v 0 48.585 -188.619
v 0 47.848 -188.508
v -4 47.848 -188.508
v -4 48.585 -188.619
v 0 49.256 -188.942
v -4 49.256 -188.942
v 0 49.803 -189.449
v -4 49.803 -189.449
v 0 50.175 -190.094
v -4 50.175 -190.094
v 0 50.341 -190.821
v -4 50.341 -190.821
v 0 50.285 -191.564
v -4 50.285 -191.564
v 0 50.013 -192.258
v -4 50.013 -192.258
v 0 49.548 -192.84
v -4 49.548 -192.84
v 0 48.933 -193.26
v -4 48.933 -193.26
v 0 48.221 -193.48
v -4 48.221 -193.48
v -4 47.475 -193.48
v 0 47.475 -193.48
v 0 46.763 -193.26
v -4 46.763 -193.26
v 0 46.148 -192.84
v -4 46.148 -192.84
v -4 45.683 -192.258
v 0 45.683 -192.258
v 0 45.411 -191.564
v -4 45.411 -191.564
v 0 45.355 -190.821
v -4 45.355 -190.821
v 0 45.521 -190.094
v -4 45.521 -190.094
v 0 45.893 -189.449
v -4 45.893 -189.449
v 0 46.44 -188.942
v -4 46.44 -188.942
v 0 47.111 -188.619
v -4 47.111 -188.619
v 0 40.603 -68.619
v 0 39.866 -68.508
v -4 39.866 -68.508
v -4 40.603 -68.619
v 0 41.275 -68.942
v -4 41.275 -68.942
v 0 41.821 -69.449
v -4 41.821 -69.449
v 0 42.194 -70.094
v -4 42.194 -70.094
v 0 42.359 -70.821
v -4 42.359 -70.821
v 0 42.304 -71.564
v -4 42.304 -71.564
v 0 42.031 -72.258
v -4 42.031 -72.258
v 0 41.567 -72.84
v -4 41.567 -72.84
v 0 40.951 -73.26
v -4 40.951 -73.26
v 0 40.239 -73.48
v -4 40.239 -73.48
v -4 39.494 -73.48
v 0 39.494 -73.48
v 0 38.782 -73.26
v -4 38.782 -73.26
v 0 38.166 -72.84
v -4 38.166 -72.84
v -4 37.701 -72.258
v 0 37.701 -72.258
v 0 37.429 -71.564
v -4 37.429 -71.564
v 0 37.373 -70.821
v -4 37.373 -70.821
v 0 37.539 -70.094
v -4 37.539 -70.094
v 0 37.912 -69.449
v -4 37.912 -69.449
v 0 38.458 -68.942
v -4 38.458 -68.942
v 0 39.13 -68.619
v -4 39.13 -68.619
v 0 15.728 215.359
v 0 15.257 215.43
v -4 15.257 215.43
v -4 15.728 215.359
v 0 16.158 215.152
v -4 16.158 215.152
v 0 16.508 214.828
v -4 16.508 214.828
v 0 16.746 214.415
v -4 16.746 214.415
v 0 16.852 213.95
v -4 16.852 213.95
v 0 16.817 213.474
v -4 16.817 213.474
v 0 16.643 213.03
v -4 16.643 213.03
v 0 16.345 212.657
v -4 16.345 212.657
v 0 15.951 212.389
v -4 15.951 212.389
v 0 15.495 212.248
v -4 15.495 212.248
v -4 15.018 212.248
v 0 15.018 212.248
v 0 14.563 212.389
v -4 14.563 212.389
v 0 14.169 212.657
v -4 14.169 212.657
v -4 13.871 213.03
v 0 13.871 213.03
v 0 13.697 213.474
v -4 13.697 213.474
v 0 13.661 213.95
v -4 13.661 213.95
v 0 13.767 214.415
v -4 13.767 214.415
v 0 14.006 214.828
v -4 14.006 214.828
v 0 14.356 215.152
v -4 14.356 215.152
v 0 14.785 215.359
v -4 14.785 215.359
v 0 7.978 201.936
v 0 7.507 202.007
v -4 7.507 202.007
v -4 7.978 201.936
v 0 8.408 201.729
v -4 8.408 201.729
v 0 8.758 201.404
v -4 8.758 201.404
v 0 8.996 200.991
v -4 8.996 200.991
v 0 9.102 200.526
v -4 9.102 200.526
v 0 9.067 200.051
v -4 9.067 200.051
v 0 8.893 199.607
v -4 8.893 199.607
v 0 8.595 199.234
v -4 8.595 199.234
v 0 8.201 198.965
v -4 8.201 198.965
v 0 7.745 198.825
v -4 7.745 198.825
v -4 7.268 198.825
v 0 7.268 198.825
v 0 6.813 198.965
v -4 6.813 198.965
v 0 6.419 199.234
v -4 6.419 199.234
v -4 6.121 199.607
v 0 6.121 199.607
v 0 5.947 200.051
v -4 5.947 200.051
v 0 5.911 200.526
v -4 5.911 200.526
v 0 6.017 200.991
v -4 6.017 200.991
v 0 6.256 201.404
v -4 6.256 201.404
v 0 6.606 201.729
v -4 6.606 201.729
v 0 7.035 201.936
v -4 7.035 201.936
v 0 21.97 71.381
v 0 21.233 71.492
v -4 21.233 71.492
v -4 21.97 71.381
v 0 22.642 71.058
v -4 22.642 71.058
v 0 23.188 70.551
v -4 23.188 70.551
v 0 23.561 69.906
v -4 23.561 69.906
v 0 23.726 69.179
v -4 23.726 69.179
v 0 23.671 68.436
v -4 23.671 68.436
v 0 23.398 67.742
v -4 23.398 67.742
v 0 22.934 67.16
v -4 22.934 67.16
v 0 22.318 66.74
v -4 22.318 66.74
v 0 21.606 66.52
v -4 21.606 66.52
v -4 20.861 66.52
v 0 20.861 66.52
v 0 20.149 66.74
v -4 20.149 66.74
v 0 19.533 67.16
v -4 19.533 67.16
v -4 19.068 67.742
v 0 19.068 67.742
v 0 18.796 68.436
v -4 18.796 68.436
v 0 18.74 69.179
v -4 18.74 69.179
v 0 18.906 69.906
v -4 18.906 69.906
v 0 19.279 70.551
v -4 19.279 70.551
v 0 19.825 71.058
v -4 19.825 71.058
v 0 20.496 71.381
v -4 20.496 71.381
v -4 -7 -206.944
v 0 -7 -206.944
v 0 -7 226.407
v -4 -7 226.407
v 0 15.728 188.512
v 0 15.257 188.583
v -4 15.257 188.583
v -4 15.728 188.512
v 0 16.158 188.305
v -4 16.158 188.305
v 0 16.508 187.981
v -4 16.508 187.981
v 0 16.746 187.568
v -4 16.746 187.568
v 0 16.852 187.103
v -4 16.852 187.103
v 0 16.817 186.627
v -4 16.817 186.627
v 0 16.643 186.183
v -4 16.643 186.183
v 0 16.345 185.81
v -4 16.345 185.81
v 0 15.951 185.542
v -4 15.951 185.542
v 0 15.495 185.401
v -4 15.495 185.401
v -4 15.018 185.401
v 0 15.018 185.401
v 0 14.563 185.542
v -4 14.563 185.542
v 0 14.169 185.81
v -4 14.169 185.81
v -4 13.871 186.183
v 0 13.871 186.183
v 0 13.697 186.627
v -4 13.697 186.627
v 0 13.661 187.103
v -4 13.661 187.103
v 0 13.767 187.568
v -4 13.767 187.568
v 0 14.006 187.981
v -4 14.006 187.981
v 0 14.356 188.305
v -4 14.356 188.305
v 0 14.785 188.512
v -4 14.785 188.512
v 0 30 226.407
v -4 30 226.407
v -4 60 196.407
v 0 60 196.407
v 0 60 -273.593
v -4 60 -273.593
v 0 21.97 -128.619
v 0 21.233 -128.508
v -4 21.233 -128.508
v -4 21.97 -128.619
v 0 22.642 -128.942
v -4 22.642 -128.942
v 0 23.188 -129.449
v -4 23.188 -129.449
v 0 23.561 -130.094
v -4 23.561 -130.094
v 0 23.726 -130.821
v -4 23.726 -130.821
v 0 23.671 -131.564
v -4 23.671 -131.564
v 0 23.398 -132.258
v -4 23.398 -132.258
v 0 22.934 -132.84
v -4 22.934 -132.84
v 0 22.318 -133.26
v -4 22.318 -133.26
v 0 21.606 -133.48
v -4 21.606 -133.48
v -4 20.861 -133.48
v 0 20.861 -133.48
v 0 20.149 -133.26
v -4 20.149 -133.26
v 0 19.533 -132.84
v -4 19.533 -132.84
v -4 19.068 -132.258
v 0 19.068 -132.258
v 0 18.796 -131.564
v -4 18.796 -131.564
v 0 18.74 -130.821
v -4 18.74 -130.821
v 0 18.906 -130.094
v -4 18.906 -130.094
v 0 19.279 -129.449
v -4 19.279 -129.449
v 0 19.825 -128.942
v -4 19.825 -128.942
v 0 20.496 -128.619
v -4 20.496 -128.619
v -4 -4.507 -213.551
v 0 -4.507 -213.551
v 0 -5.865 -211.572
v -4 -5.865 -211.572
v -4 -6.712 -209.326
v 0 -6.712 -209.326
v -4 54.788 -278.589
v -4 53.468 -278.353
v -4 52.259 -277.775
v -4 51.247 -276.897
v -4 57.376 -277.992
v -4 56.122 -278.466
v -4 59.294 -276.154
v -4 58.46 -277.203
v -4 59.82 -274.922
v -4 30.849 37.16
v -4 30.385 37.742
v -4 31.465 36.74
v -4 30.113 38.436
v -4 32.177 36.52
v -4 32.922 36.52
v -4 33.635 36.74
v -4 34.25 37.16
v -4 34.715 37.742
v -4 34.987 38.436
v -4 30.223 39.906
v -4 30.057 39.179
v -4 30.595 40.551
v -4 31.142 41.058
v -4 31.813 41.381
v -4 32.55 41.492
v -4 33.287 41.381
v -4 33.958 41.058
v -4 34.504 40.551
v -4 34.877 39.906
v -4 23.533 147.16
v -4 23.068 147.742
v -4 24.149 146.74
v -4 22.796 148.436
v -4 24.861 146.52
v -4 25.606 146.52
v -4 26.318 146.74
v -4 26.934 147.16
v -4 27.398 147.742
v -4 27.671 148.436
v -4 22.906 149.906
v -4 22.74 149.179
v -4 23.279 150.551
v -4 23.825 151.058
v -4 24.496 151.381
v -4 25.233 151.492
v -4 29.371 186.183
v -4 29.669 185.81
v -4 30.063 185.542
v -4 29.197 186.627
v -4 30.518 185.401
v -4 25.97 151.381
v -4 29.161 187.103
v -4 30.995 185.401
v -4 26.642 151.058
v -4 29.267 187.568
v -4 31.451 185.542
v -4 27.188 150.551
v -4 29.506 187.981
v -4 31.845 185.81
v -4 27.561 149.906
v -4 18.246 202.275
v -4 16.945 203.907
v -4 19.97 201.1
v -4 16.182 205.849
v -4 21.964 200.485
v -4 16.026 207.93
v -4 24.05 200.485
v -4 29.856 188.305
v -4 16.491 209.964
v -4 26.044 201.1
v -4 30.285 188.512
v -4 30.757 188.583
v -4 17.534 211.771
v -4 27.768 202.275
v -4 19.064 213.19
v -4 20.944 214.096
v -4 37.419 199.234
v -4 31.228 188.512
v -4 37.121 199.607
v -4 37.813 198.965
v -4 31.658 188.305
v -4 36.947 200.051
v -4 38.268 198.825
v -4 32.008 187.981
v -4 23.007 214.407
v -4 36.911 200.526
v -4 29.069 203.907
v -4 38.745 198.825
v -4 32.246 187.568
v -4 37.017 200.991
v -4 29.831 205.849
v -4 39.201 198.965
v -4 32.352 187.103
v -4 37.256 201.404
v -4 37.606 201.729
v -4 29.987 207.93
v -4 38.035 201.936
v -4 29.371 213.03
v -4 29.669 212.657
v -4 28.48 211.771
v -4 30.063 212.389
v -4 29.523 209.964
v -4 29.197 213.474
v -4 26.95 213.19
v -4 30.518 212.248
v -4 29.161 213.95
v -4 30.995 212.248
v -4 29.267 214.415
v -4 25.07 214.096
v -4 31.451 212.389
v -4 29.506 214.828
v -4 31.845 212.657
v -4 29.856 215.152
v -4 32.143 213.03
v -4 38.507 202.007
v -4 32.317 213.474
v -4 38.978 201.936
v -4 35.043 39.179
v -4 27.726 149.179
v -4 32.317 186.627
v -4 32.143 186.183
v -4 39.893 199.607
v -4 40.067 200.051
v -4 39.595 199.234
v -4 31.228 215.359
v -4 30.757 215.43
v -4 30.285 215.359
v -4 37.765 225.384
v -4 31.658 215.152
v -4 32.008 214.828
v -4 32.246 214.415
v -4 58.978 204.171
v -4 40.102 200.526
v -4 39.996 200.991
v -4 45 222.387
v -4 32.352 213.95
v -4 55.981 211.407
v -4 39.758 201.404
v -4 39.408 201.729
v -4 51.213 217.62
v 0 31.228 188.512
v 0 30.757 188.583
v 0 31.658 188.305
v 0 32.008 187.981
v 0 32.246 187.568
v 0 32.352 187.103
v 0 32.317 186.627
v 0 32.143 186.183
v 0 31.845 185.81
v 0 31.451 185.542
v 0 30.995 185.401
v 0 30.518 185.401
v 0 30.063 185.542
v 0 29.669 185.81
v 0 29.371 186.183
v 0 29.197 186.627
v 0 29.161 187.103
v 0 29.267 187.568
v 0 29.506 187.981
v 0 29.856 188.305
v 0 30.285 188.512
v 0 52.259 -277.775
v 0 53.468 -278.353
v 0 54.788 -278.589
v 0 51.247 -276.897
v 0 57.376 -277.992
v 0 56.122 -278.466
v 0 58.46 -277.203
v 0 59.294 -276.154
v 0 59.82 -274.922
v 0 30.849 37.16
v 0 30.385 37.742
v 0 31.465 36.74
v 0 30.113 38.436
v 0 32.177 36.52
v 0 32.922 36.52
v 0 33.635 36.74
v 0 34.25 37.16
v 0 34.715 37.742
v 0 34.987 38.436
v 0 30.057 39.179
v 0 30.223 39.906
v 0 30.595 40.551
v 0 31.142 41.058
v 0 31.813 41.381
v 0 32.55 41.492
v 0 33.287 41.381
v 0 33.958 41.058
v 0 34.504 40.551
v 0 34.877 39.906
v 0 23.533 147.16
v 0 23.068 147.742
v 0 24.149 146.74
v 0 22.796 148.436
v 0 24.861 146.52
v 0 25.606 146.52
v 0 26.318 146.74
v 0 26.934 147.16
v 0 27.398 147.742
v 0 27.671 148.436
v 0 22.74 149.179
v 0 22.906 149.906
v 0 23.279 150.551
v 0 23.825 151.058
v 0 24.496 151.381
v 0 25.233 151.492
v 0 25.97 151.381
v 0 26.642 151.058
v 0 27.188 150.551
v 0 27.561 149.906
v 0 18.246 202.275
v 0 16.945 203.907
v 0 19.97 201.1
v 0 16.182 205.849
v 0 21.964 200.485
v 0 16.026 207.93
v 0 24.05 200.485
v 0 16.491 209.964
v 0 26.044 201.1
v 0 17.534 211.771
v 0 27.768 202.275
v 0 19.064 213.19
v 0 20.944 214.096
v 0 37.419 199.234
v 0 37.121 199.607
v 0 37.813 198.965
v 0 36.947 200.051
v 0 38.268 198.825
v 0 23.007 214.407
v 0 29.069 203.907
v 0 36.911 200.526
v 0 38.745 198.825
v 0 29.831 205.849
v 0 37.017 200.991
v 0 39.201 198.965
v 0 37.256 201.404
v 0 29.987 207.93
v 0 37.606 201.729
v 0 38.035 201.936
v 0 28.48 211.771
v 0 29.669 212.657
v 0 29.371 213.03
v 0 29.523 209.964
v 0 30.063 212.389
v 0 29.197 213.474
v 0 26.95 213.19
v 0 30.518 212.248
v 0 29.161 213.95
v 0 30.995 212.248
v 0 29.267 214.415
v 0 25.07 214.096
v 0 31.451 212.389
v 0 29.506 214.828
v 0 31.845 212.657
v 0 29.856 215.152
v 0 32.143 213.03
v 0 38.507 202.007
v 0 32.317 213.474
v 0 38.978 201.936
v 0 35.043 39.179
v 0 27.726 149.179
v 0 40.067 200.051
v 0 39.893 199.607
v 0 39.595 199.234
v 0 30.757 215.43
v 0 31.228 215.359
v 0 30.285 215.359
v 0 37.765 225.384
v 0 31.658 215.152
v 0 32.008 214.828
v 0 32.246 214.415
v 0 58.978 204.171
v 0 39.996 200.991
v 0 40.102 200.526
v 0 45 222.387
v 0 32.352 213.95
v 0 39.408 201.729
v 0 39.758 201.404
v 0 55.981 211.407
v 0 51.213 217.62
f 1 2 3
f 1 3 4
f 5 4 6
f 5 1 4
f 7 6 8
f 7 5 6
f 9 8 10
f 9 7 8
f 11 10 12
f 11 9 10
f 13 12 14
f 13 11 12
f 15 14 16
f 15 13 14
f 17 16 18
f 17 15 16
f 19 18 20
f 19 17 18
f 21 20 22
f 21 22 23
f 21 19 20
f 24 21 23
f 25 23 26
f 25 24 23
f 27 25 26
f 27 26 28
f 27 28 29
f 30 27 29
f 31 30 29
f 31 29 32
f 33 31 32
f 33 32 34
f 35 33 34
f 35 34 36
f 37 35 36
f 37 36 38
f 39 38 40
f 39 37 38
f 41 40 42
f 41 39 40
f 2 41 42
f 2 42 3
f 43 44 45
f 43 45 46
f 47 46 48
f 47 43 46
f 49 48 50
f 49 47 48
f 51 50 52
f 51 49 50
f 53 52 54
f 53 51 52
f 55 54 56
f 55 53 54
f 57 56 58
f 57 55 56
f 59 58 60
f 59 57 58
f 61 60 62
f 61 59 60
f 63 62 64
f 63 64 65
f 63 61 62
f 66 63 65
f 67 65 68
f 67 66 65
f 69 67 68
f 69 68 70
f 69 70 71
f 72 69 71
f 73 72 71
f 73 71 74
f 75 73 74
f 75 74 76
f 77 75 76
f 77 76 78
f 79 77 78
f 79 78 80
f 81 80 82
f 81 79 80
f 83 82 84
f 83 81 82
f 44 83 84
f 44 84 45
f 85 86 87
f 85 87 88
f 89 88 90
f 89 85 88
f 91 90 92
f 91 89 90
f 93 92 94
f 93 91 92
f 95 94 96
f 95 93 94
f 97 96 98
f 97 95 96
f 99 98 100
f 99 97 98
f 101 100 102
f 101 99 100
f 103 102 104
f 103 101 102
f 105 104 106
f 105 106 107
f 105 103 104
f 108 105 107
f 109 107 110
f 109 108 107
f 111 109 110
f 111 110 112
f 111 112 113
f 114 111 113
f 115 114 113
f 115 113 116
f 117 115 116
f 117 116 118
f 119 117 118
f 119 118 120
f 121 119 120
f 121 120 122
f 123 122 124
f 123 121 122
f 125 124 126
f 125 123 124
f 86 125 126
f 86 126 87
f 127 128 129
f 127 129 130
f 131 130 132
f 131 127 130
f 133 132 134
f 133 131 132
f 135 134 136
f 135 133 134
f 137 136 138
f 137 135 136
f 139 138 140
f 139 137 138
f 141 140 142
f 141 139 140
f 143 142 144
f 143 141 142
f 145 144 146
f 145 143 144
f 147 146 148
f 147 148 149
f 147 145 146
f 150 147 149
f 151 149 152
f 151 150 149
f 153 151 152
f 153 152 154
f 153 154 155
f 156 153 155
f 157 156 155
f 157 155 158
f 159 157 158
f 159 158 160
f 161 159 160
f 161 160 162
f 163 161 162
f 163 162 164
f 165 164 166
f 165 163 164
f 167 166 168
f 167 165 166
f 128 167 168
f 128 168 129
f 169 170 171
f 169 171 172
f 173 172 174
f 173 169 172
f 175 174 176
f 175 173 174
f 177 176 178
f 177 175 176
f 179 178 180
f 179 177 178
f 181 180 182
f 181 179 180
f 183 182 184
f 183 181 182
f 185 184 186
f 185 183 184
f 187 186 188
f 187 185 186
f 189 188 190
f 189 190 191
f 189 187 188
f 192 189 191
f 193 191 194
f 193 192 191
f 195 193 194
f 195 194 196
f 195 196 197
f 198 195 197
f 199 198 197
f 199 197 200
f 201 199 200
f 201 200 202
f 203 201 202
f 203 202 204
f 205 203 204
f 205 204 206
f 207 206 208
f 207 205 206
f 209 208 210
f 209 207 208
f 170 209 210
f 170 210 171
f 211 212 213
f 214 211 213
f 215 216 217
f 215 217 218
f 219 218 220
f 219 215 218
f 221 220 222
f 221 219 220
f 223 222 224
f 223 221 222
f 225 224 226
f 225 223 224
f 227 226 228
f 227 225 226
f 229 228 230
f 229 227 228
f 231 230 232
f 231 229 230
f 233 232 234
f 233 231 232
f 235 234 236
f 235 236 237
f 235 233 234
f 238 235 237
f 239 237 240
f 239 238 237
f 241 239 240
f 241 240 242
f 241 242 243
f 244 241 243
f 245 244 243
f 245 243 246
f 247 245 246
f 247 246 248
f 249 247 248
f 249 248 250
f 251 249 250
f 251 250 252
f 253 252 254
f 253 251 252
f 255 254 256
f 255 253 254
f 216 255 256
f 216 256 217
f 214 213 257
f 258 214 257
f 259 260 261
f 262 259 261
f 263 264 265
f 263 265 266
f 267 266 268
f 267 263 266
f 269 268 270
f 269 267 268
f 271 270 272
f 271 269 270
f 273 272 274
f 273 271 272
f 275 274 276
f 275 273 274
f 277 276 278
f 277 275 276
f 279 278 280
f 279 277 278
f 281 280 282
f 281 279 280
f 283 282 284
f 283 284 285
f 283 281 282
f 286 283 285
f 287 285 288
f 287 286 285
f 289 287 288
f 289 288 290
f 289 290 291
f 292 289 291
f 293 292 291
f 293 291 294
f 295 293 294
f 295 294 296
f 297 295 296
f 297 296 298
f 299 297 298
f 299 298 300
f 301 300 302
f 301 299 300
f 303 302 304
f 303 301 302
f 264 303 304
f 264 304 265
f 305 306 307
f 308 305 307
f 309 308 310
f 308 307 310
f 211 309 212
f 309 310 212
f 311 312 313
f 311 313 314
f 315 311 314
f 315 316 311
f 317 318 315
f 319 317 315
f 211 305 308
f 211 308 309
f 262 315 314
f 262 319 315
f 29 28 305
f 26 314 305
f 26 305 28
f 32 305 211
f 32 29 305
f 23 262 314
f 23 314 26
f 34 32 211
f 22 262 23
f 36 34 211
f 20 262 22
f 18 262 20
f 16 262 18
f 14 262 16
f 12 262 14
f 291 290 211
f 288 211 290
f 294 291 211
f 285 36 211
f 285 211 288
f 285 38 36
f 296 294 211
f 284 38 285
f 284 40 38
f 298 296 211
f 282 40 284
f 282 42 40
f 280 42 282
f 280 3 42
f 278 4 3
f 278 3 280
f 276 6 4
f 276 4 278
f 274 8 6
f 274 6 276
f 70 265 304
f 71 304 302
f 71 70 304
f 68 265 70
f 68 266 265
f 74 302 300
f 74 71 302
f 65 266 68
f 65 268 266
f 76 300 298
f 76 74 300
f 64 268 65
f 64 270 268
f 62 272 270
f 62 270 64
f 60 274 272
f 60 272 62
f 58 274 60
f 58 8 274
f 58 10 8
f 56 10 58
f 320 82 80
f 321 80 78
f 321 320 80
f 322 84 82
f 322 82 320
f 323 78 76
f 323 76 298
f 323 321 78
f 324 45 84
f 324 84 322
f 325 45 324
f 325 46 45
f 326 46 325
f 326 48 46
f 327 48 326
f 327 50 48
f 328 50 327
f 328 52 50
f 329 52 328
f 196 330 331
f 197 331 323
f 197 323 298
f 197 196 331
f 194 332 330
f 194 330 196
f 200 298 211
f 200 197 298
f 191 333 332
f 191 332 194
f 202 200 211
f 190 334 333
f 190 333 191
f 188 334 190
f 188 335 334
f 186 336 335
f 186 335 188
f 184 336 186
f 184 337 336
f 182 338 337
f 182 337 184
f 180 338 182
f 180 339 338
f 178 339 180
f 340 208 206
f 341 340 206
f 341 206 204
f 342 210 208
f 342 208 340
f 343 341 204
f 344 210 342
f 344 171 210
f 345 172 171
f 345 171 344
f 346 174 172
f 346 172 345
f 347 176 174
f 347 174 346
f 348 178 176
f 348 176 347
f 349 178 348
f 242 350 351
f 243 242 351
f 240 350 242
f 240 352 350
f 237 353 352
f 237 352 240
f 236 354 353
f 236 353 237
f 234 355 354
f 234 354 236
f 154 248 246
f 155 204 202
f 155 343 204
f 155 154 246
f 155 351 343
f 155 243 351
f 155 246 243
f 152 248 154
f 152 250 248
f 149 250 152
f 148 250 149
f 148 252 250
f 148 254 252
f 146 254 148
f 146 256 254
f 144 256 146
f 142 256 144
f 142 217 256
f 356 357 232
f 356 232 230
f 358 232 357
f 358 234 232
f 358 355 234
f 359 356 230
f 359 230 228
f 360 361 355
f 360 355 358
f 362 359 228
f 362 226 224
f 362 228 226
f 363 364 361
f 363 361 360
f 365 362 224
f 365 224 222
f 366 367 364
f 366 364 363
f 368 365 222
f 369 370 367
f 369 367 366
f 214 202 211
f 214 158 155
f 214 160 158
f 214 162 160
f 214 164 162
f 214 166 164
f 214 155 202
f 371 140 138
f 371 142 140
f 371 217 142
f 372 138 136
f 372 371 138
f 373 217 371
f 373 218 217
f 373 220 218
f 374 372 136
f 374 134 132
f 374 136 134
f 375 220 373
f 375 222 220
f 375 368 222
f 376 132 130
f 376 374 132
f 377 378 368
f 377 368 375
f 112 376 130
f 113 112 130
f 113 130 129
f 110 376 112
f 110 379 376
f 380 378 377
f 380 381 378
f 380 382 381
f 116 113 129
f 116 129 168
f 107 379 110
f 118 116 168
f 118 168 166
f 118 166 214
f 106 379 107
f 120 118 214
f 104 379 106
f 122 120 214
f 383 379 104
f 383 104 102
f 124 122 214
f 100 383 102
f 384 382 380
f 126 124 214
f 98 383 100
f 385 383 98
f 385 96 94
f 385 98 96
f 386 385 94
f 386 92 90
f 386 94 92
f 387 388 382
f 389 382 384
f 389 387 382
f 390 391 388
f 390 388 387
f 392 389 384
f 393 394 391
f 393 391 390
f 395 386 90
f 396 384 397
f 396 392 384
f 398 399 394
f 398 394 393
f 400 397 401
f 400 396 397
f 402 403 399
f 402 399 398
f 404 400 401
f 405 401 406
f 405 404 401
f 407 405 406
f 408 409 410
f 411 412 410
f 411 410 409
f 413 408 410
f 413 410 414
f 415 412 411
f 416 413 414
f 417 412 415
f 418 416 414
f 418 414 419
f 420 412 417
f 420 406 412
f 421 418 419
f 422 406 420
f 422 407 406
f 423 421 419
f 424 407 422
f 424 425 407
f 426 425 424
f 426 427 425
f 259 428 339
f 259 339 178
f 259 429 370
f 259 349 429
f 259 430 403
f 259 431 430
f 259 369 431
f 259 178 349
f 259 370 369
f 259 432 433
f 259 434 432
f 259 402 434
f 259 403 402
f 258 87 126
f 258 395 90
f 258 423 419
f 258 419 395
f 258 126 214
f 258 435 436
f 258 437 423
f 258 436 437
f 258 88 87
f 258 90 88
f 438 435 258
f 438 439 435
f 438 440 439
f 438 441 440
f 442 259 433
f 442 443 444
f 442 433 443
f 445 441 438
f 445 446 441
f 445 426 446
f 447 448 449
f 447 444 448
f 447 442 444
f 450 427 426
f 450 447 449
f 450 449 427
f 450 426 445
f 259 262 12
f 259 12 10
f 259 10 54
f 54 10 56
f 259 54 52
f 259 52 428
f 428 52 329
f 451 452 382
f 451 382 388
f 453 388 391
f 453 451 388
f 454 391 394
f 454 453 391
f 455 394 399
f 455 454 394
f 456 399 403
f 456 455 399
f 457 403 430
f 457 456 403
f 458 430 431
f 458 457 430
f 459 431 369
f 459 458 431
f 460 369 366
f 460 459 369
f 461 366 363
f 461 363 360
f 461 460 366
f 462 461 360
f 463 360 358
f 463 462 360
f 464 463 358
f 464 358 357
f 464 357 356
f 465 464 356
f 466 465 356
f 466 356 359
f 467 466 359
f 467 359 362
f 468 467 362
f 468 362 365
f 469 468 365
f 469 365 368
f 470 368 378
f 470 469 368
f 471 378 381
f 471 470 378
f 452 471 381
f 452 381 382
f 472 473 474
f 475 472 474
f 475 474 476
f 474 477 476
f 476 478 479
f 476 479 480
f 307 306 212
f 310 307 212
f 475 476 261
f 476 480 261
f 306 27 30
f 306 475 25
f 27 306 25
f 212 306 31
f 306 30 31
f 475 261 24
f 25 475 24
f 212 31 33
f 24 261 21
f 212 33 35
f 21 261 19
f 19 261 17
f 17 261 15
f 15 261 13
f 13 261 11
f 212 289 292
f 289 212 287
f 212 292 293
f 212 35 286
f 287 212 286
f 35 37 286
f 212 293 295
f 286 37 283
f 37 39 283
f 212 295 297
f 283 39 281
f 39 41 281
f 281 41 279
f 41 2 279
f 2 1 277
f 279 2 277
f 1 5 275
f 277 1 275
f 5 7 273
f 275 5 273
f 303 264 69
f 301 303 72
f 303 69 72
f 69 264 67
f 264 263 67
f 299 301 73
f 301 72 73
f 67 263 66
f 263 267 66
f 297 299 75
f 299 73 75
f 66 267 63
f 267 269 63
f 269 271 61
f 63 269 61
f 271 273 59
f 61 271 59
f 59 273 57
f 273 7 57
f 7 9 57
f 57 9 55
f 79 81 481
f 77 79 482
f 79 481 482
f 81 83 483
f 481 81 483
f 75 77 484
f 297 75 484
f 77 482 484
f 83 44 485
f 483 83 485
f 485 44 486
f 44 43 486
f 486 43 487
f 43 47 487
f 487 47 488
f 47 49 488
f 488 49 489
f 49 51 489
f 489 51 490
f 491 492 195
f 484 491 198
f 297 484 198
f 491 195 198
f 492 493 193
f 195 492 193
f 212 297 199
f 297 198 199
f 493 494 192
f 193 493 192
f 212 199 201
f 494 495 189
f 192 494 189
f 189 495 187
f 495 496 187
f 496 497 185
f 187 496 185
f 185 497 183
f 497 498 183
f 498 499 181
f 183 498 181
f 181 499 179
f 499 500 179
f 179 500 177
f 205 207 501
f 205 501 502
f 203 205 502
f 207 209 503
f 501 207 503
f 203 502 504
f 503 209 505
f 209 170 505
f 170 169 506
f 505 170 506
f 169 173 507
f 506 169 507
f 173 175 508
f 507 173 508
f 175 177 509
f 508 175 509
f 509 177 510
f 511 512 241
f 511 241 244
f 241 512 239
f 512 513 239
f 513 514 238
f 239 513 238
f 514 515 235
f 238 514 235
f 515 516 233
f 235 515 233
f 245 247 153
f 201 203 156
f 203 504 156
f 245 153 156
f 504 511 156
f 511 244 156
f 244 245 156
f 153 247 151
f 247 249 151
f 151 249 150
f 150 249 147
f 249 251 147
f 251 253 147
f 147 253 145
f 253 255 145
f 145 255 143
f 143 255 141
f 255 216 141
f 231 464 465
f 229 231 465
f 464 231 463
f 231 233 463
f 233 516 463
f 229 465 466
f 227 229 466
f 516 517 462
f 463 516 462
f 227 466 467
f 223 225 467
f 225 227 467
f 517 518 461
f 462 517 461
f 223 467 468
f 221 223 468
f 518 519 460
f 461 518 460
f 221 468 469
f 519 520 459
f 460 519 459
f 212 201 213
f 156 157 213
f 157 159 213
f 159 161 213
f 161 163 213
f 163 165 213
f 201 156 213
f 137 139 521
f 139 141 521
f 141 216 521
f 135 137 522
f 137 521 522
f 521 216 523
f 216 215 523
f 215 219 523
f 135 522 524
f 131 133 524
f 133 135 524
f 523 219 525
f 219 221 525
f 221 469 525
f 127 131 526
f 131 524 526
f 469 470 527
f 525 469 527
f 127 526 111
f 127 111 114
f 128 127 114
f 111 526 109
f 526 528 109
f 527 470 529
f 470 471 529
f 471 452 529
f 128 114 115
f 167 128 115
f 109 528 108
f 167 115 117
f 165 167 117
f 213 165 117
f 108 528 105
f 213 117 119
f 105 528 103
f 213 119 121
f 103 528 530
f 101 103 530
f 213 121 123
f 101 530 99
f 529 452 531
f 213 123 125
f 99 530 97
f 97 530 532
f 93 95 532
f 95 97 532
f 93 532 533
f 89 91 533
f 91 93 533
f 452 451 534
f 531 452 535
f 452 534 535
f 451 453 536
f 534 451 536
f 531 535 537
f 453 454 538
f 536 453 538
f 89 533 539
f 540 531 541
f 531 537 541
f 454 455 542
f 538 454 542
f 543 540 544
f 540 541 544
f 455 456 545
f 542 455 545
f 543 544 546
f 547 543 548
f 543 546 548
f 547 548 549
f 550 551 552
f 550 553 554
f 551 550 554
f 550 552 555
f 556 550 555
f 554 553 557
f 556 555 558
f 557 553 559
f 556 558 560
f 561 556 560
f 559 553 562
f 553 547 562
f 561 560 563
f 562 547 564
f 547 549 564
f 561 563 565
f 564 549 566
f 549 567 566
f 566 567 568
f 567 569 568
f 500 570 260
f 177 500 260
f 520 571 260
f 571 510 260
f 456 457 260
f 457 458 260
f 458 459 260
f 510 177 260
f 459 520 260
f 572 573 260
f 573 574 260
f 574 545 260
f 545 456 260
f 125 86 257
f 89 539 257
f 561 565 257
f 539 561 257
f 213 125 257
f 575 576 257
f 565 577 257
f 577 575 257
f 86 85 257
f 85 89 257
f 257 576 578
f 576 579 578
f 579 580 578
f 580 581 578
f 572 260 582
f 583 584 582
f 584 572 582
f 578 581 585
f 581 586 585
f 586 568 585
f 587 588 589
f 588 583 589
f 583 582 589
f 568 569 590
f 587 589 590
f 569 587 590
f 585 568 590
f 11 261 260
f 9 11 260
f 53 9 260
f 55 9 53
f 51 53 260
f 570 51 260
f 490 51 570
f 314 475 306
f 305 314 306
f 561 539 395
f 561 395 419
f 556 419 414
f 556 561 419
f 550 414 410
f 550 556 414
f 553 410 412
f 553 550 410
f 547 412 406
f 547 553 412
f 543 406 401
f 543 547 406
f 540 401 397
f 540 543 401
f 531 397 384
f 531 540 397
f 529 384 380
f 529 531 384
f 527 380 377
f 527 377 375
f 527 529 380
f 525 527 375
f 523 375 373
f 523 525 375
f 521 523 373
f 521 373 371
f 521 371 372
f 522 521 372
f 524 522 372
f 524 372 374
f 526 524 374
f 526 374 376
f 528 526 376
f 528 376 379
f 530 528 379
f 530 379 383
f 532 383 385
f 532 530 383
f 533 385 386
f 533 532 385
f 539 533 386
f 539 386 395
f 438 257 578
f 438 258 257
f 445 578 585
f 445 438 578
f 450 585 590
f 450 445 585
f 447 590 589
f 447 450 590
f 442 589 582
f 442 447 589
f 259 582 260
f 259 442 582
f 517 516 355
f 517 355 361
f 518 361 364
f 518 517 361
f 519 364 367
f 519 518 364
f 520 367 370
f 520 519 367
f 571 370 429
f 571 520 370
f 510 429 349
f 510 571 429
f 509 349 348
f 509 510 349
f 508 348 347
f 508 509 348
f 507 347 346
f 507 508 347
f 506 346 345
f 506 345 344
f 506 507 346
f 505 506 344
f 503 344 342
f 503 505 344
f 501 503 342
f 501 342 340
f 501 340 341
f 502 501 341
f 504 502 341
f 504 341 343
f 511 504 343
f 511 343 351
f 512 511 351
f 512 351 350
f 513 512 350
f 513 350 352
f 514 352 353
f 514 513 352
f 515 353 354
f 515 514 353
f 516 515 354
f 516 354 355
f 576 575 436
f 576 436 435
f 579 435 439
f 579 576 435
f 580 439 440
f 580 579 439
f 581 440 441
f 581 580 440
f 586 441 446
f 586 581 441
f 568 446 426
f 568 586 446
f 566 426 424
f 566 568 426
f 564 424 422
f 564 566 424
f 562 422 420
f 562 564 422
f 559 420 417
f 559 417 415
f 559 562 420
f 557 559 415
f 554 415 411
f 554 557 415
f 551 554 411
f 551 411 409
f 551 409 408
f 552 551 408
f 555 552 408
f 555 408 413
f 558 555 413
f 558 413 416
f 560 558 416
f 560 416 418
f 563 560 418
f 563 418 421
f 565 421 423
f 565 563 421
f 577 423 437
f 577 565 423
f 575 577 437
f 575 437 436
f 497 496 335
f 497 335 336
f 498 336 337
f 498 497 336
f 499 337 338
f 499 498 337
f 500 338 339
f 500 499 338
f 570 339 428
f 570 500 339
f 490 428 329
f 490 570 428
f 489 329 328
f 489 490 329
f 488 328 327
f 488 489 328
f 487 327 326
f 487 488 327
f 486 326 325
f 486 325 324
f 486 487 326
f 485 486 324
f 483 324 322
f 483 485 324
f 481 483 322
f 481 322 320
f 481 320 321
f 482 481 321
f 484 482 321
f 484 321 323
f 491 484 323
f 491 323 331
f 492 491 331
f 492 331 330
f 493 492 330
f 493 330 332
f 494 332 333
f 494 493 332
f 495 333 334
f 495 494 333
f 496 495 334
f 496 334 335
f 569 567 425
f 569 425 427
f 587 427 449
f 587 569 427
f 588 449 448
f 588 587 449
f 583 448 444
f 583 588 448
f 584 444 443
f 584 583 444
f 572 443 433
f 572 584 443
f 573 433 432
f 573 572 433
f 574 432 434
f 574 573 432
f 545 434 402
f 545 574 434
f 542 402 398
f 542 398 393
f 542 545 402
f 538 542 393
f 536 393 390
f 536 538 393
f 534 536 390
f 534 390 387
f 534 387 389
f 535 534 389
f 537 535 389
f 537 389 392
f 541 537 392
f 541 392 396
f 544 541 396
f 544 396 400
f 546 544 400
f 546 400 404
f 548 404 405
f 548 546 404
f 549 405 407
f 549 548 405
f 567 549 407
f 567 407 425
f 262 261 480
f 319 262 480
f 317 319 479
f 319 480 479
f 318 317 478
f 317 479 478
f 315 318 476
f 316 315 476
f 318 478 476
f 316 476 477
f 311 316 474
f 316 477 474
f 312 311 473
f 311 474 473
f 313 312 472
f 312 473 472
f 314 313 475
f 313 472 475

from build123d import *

# Parameters (mm, degrees)
SKETCH_1_R      = 2.5
SKETCH_1_R_2    = 7
SKETCH_1_R_3    = 1.6
EXTRUDE_1_DEPTH = 4
FILLET_1_R      = 30


with BuildPart() as part:
    # 草图1 → 凸台-拉伸1 (new body)
    with BuildSketch(Plane.ZY):
        with BuildLine():
            Line((-206.943801285, -7), (226.406668198, -7))
            Line((226.406668198, -7), (226.406668198, 60))
            Line((226.406668198, 60), (-273.593331802, 60))
            ThreePointArc((-273.593331802, 60), (-278.27128826, 56.76542442), (-276.896763228, 51.246689353))
            Line((-276.896763228, 51.246689353), (-213.550664137, -4.506621294))
            ThreePointArc((-213.550664137, -4.506621294), (-210.474650125, -6.355912915), (-206.943801285, -7))
        make_face()
        with Locations((-191.007742204, 47.848052121)):
            Circle(SKETCH_1_R, mode=Mode.SUBTRACT)
        with Locations((68.992257796, 21.23337925)):
            Circle(SKETCH_1_R, mode=Mode.SUBTRACT)
        with Locations((38.992257796, 32.549891061)):
            Circle(SKETCH_1_R, mode=Mode.SUBTRACT)
        with Locations((-131.007742204, 21.23337925)):
            Circle(SKETCH_1_R, mode=Mode.SUBTRACT)
        with Locations((207.406668198, 23.006889262)):
            Circle(SKETCH_1_R_2, mode=Mode.SUBTRACT)
        with Locations((148.992257796, 25.23337925)):
            Circle(SKETCH_1_R, mode=Mode.SUBTRACT)
        with Locations((-71.007742204, 39.866402872)):
            Circle(SKETCH_1_R, mode=Mode.SUBTRACT)
        with Locations((213.830061956, 30.756889262)):
            Circle(SKETCH_1_R_3, mode=Mode.SUBTRACT)
        with Locations((200.406668198, 38.506889262)):
            Circle(SKETCH_1_R_3, mode=Mode.SUBTRACT)
        with Locations((186.983274439, 30.756889262)):
            Circle(SKETCH_1_R_3, mode=Mode.SUBTRACT)
        with Locations((186.983274439, 15.256889262)):
            Circle(SKETCH_1_R_3, mode=Mode.SUBTRACT)
        with Locations((200.406668198, 7.506889262)):
            Circle(SKETCH_1_R_3, mode=Mode.SUBTRACT)
        with Locations((213.830061956, 15.256889262)):
            Circle(SKETCH_1_R_3, mode=Mode.SUBTRACT)
    extrude(amount=EXTRUDE_1_DEPTH)

    # 圆角1
    fillet_1_edges = [part.edges().sort_by_distance(p)[0] for p in [
        (-2, 60, 226.406668198),
    ]]
    fillet(fillet_1_edges, radius=FILLET_1_R)


solid = part.part
